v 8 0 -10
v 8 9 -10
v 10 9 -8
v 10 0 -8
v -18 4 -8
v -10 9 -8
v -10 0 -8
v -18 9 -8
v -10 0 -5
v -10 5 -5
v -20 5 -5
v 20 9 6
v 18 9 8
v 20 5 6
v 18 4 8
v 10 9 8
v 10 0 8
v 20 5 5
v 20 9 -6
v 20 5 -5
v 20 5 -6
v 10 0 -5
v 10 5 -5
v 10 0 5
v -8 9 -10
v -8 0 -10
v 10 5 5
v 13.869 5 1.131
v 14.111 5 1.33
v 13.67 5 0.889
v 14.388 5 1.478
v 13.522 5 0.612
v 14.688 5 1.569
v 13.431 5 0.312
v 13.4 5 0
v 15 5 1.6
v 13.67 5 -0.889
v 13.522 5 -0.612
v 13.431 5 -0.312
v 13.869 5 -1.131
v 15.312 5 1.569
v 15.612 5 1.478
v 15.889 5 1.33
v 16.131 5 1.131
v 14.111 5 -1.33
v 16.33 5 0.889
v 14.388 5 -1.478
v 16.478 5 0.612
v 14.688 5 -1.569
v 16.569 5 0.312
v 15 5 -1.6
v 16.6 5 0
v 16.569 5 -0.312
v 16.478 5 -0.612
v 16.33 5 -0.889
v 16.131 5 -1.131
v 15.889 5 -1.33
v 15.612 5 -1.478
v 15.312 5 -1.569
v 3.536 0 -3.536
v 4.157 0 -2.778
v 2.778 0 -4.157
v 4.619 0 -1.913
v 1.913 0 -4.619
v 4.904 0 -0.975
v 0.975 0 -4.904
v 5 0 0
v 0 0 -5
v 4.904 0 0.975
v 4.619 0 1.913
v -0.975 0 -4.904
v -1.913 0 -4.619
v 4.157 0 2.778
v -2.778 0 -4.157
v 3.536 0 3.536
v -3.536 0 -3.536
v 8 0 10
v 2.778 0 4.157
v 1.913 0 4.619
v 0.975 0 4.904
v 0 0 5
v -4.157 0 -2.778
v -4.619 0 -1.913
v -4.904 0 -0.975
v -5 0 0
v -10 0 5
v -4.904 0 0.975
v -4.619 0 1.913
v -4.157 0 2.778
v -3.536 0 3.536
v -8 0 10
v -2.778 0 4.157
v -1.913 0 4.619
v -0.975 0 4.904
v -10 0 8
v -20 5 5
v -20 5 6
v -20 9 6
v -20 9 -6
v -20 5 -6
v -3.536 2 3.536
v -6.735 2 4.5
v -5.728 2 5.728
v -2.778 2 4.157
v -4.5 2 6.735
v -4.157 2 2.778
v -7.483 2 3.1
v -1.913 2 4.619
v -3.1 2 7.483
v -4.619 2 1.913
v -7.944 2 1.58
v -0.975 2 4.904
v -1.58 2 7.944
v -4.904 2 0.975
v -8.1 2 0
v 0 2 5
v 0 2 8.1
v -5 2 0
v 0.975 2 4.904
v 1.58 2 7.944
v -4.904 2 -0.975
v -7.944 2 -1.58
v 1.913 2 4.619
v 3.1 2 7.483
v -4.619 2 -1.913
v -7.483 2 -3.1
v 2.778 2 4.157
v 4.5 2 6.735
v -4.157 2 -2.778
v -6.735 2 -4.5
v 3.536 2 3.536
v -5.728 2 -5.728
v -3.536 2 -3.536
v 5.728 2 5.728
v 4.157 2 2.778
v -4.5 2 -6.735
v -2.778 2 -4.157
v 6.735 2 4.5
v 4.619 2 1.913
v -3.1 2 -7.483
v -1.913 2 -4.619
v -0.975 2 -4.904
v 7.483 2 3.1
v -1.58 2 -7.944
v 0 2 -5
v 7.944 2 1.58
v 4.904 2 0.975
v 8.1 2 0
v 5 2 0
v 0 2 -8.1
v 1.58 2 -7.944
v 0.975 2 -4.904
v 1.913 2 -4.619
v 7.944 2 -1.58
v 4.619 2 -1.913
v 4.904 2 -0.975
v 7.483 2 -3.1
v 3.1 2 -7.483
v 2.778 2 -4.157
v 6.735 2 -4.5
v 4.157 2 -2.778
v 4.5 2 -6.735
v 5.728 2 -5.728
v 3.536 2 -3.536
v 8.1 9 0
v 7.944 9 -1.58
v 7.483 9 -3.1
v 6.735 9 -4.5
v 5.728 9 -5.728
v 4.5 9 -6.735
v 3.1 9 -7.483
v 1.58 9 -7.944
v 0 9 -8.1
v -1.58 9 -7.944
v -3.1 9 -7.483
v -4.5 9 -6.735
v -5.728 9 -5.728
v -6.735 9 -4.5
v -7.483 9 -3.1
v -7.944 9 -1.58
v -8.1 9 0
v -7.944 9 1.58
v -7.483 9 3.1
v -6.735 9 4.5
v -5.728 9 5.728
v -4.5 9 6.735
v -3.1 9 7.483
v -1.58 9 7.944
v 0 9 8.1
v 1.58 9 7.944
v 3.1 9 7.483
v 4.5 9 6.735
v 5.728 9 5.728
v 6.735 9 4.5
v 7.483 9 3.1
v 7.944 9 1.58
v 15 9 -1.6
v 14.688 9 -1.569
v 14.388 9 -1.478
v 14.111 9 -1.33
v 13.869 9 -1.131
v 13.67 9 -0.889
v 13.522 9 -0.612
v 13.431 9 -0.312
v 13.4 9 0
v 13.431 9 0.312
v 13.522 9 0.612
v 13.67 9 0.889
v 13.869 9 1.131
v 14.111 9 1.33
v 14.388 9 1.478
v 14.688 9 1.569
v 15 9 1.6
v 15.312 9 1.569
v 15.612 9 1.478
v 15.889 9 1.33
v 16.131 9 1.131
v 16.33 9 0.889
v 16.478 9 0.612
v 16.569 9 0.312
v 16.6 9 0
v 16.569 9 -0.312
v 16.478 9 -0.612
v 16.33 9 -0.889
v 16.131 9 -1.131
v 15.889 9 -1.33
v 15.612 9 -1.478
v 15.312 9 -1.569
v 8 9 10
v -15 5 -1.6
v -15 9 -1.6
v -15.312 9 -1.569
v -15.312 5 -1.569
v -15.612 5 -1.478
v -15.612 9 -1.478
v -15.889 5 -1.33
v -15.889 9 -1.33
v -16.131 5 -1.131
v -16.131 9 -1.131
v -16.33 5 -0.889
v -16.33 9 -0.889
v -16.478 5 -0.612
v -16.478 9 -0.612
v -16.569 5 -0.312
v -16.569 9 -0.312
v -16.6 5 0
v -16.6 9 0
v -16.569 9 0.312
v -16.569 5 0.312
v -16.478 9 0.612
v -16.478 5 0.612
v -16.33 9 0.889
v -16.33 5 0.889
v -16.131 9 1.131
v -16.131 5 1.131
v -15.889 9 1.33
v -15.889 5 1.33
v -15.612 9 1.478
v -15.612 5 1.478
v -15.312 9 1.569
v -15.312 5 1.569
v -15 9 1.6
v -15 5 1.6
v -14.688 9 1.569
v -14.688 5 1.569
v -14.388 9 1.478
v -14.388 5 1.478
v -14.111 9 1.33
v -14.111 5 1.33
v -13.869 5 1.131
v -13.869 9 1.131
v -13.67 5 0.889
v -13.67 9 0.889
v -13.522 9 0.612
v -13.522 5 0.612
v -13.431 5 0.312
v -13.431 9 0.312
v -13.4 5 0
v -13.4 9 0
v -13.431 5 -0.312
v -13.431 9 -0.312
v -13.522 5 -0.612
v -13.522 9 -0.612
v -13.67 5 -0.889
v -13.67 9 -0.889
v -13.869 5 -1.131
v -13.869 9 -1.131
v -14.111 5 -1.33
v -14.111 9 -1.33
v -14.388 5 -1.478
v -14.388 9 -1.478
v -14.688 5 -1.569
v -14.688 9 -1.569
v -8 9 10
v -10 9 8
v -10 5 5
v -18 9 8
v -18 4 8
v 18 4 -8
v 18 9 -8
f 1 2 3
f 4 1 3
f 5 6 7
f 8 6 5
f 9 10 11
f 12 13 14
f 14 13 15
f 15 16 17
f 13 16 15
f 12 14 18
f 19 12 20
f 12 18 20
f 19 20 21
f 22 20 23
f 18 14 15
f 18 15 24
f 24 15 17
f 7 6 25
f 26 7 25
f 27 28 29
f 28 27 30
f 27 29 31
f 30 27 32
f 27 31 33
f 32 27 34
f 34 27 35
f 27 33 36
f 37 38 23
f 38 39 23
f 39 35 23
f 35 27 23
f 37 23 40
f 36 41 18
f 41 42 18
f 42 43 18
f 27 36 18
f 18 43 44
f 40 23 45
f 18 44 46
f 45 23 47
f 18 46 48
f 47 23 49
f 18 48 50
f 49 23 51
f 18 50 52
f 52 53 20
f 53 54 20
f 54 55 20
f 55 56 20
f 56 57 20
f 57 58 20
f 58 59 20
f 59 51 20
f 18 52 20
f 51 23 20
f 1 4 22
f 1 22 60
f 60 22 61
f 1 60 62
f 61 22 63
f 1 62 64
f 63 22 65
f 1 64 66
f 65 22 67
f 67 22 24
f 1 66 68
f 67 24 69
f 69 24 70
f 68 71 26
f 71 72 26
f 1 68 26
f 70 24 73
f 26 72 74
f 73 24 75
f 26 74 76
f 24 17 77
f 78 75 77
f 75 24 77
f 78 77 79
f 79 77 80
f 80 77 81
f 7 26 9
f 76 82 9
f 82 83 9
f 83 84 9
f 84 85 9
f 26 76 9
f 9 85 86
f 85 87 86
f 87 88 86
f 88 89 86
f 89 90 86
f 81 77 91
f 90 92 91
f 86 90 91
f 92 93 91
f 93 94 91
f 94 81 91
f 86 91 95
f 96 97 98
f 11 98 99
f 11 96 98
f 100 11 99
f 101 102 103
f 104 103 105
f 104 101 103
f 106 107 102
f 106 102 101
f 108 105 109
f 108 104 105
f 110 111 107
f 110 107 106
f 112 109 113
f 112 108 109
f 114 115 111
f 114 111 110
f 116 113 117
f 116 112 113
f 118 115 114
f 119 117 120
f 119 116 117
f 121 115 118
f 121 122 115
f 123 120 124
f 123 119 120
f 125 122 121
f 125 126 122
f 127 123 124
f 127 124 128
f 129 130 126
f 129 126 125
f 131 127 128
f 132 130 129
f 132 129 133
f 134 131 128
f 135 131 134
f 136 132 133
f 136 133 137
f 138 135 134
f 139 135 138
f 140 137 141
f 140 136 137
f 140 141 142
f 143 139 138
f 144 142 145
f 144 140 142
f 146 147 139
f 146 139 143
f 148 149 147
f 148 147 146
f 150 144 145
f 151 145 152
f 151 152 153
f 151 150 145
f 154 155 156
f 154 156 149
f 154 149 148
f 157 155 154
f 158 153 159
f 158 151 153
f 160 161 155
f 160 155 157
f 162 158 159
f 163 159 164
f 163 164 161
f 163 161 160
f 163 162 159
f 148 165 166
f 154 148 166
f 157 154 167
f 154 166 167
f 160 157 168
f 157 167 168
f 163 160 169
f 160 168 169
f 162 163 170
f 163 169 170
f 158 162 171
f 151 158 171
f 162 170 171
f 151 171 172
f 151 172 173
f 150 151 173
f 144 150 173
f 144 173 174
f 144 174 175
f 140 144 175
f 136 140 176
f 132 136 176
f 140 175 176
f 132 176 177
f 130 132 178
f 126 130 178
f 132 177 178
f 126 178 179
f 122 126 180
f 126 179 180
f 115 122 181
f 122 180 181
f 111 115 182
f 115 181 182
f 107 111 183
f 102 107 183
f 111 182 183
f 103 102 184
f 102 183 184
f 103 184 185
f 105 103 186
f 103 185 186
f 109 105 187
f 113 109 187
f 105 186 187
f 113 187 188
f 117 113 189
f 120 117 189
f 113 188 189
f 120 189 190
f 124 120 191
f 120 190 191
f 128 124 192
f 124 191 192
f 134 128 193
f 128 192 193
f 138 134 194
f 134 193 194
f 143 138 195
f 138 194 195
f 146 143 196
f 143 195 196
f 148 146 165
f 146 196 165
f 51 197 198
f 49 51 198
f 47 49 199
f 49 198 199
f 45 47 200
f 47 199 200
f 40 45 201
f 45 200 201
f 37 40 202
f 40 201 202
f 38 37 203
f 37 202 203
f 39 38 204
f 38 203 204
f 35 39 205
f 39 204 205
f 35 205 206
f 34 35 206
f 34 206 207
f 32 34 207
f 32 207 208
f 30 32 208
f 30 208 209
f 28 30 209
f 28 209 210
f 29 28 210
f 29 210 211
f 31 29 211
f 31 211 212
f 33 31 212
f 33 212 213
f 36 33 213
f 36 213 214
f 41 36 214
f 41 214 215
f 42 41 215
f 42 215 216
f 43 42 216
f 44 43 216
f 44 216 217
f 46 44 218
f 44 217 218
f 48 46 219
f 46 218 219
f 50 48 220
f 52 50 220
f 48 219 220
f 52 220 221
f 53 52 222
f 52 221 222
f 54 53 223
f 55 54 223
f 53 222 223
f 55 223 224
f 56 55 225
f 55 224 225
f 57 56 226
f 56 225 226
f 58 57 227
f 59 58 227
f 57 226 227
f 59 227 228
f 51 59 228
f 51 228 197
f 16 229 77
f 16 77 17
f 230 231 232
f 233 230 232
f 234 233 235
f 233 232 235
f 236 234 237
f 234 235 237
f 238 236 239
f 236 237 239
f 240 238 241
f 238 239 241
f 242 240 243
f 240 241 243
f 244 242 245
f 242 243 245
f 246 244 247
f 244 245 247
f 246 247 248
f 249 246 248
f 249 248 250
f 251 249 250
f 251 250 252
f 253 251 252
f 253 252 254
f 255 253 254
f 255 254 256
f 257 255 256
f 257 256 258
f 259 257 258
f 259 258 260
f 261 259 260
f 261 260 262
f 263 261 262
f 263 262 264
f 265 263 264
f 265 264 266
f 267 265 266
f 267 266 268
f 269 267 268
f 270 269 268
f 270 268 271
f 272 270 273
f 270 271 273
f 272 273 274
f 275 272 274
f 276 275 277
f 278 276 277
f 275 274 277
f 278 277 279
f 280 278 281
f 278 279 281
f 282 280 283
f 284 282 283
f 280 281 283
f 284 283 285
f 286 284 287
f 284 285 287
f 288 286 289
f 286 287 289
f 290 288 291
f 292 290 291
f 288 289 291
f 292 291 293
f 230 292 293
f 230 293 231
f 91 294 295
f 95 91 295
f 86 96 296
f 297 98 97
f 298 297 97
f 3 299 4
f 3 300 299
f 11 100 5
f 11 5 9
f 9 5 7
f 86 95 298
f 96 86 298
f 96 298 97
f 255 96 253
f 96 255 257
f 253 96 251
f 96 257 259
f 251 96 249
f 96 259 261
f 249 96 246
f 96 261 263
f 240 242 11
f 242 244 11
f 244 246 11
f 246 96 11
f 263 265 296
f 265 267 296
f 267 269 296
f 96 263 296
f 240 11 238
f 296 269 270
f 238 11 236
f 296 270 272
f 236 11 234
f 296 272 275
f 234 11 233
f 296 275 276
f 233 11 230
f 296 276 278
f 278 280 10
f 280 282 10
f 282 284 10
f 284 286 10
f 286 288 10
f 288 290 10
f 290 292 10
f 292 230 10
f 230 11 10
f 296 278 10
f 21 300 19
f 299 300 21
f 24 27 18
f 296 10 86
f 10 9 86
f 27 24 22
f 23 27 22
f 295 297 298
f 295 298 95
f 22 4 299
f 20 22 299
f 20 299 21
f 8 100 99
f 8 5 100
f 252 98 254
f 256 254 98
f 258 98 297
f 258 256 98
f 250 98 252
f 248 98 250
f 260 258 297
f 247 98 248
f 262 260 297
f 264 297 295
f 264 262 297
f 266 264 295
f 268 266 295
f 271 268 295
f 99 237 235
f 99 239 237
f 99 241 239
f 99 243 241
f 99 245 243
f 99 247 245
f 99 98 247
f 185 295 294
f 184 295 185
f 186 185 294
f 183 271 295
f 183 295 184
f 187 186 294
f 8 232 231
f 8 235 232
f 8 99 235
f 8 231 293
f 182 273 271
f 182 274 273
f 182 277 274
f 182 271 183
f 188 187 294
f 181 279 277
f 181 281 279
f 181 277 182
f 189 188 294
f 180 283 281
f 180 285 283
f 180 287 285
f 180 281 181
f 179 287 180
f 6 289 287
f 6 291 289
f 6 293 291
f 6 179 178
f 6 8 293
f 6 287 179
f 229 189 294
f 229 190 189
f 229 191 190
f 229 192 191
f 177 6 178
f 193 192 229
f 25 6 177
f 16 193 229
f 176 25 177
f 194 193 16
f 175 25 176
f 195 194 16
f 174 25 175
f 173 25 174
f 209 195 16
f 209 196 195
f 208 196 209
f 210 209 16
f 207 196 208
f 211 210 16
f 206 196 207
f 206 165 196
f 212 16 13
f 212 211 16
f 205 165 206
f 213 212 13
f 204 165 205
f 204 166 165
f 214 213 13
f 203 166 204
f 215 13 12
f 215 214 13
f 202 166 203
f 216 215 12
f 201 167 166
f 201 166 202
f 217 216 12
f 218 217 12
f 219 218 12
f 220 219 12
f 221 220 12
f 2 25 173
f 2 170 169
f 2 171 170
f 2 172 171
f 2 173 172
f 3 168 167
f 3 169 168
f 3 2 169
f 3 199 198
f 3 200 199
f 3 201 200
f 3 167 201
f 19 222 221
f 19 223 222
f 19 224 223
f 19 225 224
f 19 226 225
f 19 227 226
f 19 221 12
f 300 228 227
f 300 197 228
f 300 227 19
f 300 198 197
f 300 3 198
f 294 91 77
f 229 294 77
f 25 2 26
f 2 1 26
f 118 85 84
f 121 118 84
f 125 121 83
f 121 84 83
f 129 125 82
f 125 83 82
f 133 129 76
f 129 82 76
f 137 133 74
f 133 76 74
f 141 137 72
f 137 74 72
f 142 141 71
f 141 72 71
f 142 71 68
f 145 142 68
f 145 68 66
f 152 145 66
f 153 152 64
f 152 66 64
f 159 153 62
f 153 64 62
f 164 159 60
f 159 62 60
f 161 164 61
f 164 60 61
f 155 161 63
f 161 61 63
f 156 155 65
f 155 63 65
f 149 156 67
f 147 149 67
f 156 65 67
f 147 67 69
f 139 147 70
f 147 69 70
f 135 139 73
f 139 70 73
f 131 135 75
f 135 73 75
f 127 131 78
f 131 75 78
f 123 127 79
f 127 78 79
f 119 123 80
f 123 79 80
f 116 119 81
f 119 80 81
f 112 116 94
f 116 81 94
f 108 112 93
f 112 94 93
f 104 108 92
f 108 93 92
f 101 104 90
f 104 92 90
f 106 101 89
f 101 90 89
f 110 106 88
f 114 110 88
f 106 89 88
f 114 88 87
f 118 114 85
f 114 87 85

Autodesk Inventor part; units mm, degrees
ref_plane "YZ Plane" through (0, 0, 0) normal (1, 0, 0) x (0, 1, 0)
ref_plane "XZ Plane" through (0, 0, 0) normal (0, 1, 0) x (-1, 0, 0)
ref_plane "XY Plane" through (0, 0, 0) normal (0, 0, 1) x (1, 0, 0)
sketch "Эскиз1" plane through (0, 0, 0) normal (0, 1, 0) x (-1, 0, 0)
  circle A0 centre (0, 0) radius 5
  line L0 (8, 10) -> (-8, 10)
  line L1 (-10, 8) -> (-10, -8)
  line L2 (-8, -10) -> (8, -10)
  line L3 (10, -8) -> (10, 8)
  circle A1 centre (0, 0) radius 8 construction
  line L4 (8, 10) -> (10, 8)
  line L5 (10, -8) -> (8, -10)
  line L6 (-8, -10) -> (-10, -8)
  line L7 (-8, 10) -> (-10, 8)
  point P0 (10, 10)
  point P1 (-10, -10)
  point P2 (-10, 10)
  point P3 (10, -10)
  point P4 (0, -10)
  point P5 (10, 0)
  dimension "d0" = 10
  dimension "d3" = 16
  dimension "d4" = 20
  dimension "d5" = 20
  dimension "d6" = 2
  dimension "d7" = 2
  dimension "d8" = 2
  dimension "d9" = 2
  dimension "d10" = 2
  dimension "d11" = 2
  dimension "d12" = 2
  dimension "d13" = 2
extrude "Выдавливание1" add sketch "Эскиз1" along normal blind 5
sketch "Эскиз4" plane through (0, 5, 0) normal (0, 1, 0) x (1, 0, 0)
  line L0 (12.8246, 0) -> (14.4123, 2.75) construction
  line L1 (14.4123, 2.75) -> (17.5877, 2.75) construction
  line L2 (17.5877, 2.75) -> (19.1754, 0) construction
  line L3 (19.1754, 0) -> (17.5877, -2.75) construction
  line L4 (17.5877, -2.75) -> (14.4123, -2.75) construction
  line L5 (14.4123, -2.75) -> (12.8246, 0) construction
  line L6 (10, -8) -> (20, -8)
  line L7 (20, -8) -> (20, 8)
  line L8 (20, 8) -> (10, 8)
  line L9 (8, -10) -> (10, -8) projected
  line L10 (10, -8) -> (8, -10)
  line L11 (8, -10) -> (0, -10)
  line L12 (8, -10) -> (-8, -10) projected
  line L13 (8, 10) -> (0, 10)
  line L14 (8, 10) -> (-8, 10) projected
  line L15 (10, 8) -> (8, 10) projected
  line L16 (10, 8) -> (8, 10)
  line L17 (0, -18.8546) -> (0, 18.8546)
  line L18 (-12.8246, 0) -> (-14.4123, 2.75) construction
  line L19 (-14.4123, 2.75) -> (-17.5877, 2.75) construction
  line L20 (-17.5877, 2.75) -> (-19.1754, 0) construction
  line L21 (-19.1754, 0) -> (-17.5877, -2.75) construction
  line L22 (-17.5877, -2.75) -> (-14.4123, -2.75) construction
  line L23 (-14.4123, -2.75) -> (-12.8246, 0) construction
  line L24 (-10, -8) -> (-20, -8)
  line L25 (-20, -8) -> (-20, 8)
  line L26 (-20, 8) -> (-10, 8)
  line L27 (-8, -10) -> (-10, -8)
  line L28 (-10, -8) -> (-8, -10)
  line L29 (-8, -10) -> (0, -10)
  line L30 (-8, 10) -> (0, 10)
  line L31 (-10, 8) -> (-8, 10)
  line L32 (-10, 8) -> (-8, 10)
  point P0 (0, 0)
  point P1 (16, 0)
  point P2 (0, 0)
  point P3 (-16, 0)
  dimension "d17" = 5.5
  dimension "d18" = 16
  dimension "d19" = 10
extrude "Выдавливание2" add sketch "Эскиз4" along normal blind 4
sketch "Эскиз7" plane through (0, 9, 0) normal (0, 1, 0) x (1, 0, 0)
  circle A0 centre (0, 0) radius 8.1
  dimension "d26" = 16.2
extrude "Выдавливание4" cut sketch "Эскиз7" against normal blind 7
sketch "Эскиз10" plane through (-10, 5, -8) normal (0, 0, -1) x (-1, 0, 0)
  line L0 (10, 0) -> (10, 4) projected
  line L1 (-2, -5) -> (0, -5) projected
  line L2 (10, 0) -> (0, -5)
  line L3 (0, -5) -> (0, 0)
  line L4 (10, 0) -> (0, 0) projected
  line L5 (0, 0) -> (10, 0)
  point P0 (-10, -5)
extrude "Выдавливание5" add sketch "Эскиз10" against normal blind 3
mirror "Зеркальное отражение1" about plane through (0, 0, 0) normal (0, 0, 1) of "Выдавливание5"
mirror "Зеркальное отражение2" about plane through (0, 0, 0) normal (1, 0, 0) of "Выдавливание5", "Зеркальное отражение1"
chamfer "Фаска1" distance 2 angle 45 4 edges at (-20, 7, -8) (20, 7, -8) (20, 7, 8) (-20, 7, 8)
sketch "Эскиз11" plane through (0, 5, 0) normal (0, -1, 0) x (1, 0, 0)
  point P0 (0, 0)
  point P1 (15, 0)
  point P2 (-15, 0)
  dimension "d48" = 30
  dimension "d49" = 15
hole "Отверстие2" at (15, 5, 0) at (-15, 5, 0) direction (0, 1, 0) diameter 3.2 end through all
equation "\"d7\" = d6"
equation "\"d8\" = d6"
equation "\"d9\" = d8"
equation "\"d10\" = d6"
equation "\"d11\" = d10"
equation "\"d12\" = d6"
equation "\"d13\" = d12"
properties part number "Sharrnir"
